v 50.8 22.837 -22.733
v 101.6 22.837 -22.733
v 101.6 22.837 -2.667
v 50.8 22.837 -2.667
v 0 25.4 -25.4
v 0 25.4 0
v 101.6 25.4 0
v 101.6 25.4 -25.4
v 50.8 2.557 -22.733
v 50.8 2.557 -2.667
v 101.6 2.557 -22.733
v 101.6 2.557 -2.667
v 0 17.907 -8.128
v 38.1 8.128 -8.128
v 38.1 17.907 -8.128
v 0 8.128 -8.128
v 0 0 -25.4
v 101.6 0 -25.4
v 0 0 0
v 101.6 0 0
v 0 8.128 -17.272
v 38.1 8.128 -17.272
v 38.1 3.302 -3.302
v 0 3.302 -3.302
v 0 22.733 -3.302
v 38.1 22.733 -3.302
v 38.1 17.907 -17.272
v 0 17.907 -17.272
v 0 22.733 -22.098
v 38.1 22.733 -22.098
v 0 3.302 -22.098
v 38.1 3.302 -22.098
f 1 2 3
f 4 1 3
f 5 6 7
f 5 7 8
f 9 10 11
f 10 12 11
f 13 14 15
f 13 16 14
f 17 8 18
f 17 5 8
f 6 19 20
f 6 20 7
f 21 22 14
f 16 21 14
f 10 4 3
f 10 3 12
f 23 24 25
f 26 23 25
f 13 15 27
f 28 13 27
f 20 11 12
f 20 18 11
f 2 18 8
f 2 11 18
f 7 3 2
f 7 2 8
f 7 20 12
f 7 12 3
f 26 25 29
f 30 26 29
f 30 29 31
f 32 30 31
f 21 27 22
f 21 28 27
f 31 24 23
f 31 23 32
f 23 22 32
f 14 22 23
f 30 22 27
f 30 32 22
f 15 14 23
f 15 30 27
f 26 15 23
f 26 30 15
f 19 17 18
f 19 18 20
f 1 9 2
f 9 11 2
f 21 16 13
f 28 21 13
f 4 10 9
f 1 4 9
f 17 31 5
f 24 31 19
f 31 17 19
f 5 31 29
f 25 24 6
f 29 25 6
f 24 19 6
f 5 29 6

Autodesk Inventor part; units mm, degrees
ref_plane "YZ Plane" through (0, 0, 0) normal (1, 0, 0) x (0, 1, 0)
ref_plane "XZ Plane" through (0, 0, 0) normal (0, 1, 0) x (-1, 0, 0)
ref_plane "XY Plane" through (0, 0, 0) normal (0, 0, 1) x (1, 0, 0)
sketch "Sketch1" plane through (0, 0, 0) normal (1, 0, 0) x (0, 1, 0)
  point P0 (0, 0)
sketch "Sketch2" plane through (0, 0, 0) normal (1, 0, 0) x (0, 1, 0)
  line L0 (0, 0) -> (25.4, 0)
  line L1 (25.4, 0) -> (25.4, -25.4)
  line L2 (25.4, -25.4) -> (0, -25.4)
  line L3 (0, -25.4) -> (0, 0)
  dimension "d0" = 25.4
  dimension "d1" = 25.4
extrude "Extrusion1" add sketch "Sketch2" along normal blind 101.6
sketch "Sketch3" plane through (101.6, 0, 0) normal (1, 0, 0) x (0, 0, -1)
  line L0 (0, 0) -> (25.4, 0) projected
  line L1 (0, 0) -> (3.175, 0)
  line L2 (3.175, 0) -> (0, 0)
  line L3 (2.667, 3.175) -> (2.667, 2.5569)
  line L4 (2.667, 2.5569) -> (3.175, 2.5569)
  line L5 (2.667, 2.5569) -> (22.733, 2.5569)
  line L6 (22.733, 2.5569) -> (22.733, 22.837)
  line L7 (22.733, 22.837) -> (2.667, 22.837)
  line L8 (2.667, 22.837) -> (2.667, 2.5569)
extrude "Extrusion2" cut sketch "Sketch3" against normal blind 50.8
sketch "Sketch4" plane through (0, 0, 0) normal (-1, 0, 0) x (0, 0, 1)
  line L0 (-25.4, 0) -> (-25.4, 25.4) projected
  line L1 (-25.4, 25.4) -> (0, 25.4) projected
  line L2 (-22.225, 3.175) -> (-3.175, 3.175) projected
  line L3 (-22.225, 22.225) -> (-22.225, 3.175) projected
  line L4 (-21.59, 3.302) -> (-22.098, 3.302)
  line L5 (-17.272, 8.128) -> (-8.128, 8.128)
  line L6 (-8.128, 8.128) -> (-8.128, 17.907)
  line L7 (-8.128, 17.907) -> (-17.272, 17.907)
  line L8 (-17.272, 17.907) -> (-17.272, 8.128)
  line L9 (-22.098, 3.302) -> (-3.302, 3.302)
  line L10 (-3.302, 3.302) -> (-3.302, 22.733)
  line L11 (-3.302, 22.733) -> (-22.098, 22.733)
  line L12 (-22.098, 22.733) -> (-22.098, 3.302)
extrude "Extrusion3" cut sketch "Sketch4" against normal blind 38.1
properties part number "Left Side Piece Corrected 0.02 inch"
